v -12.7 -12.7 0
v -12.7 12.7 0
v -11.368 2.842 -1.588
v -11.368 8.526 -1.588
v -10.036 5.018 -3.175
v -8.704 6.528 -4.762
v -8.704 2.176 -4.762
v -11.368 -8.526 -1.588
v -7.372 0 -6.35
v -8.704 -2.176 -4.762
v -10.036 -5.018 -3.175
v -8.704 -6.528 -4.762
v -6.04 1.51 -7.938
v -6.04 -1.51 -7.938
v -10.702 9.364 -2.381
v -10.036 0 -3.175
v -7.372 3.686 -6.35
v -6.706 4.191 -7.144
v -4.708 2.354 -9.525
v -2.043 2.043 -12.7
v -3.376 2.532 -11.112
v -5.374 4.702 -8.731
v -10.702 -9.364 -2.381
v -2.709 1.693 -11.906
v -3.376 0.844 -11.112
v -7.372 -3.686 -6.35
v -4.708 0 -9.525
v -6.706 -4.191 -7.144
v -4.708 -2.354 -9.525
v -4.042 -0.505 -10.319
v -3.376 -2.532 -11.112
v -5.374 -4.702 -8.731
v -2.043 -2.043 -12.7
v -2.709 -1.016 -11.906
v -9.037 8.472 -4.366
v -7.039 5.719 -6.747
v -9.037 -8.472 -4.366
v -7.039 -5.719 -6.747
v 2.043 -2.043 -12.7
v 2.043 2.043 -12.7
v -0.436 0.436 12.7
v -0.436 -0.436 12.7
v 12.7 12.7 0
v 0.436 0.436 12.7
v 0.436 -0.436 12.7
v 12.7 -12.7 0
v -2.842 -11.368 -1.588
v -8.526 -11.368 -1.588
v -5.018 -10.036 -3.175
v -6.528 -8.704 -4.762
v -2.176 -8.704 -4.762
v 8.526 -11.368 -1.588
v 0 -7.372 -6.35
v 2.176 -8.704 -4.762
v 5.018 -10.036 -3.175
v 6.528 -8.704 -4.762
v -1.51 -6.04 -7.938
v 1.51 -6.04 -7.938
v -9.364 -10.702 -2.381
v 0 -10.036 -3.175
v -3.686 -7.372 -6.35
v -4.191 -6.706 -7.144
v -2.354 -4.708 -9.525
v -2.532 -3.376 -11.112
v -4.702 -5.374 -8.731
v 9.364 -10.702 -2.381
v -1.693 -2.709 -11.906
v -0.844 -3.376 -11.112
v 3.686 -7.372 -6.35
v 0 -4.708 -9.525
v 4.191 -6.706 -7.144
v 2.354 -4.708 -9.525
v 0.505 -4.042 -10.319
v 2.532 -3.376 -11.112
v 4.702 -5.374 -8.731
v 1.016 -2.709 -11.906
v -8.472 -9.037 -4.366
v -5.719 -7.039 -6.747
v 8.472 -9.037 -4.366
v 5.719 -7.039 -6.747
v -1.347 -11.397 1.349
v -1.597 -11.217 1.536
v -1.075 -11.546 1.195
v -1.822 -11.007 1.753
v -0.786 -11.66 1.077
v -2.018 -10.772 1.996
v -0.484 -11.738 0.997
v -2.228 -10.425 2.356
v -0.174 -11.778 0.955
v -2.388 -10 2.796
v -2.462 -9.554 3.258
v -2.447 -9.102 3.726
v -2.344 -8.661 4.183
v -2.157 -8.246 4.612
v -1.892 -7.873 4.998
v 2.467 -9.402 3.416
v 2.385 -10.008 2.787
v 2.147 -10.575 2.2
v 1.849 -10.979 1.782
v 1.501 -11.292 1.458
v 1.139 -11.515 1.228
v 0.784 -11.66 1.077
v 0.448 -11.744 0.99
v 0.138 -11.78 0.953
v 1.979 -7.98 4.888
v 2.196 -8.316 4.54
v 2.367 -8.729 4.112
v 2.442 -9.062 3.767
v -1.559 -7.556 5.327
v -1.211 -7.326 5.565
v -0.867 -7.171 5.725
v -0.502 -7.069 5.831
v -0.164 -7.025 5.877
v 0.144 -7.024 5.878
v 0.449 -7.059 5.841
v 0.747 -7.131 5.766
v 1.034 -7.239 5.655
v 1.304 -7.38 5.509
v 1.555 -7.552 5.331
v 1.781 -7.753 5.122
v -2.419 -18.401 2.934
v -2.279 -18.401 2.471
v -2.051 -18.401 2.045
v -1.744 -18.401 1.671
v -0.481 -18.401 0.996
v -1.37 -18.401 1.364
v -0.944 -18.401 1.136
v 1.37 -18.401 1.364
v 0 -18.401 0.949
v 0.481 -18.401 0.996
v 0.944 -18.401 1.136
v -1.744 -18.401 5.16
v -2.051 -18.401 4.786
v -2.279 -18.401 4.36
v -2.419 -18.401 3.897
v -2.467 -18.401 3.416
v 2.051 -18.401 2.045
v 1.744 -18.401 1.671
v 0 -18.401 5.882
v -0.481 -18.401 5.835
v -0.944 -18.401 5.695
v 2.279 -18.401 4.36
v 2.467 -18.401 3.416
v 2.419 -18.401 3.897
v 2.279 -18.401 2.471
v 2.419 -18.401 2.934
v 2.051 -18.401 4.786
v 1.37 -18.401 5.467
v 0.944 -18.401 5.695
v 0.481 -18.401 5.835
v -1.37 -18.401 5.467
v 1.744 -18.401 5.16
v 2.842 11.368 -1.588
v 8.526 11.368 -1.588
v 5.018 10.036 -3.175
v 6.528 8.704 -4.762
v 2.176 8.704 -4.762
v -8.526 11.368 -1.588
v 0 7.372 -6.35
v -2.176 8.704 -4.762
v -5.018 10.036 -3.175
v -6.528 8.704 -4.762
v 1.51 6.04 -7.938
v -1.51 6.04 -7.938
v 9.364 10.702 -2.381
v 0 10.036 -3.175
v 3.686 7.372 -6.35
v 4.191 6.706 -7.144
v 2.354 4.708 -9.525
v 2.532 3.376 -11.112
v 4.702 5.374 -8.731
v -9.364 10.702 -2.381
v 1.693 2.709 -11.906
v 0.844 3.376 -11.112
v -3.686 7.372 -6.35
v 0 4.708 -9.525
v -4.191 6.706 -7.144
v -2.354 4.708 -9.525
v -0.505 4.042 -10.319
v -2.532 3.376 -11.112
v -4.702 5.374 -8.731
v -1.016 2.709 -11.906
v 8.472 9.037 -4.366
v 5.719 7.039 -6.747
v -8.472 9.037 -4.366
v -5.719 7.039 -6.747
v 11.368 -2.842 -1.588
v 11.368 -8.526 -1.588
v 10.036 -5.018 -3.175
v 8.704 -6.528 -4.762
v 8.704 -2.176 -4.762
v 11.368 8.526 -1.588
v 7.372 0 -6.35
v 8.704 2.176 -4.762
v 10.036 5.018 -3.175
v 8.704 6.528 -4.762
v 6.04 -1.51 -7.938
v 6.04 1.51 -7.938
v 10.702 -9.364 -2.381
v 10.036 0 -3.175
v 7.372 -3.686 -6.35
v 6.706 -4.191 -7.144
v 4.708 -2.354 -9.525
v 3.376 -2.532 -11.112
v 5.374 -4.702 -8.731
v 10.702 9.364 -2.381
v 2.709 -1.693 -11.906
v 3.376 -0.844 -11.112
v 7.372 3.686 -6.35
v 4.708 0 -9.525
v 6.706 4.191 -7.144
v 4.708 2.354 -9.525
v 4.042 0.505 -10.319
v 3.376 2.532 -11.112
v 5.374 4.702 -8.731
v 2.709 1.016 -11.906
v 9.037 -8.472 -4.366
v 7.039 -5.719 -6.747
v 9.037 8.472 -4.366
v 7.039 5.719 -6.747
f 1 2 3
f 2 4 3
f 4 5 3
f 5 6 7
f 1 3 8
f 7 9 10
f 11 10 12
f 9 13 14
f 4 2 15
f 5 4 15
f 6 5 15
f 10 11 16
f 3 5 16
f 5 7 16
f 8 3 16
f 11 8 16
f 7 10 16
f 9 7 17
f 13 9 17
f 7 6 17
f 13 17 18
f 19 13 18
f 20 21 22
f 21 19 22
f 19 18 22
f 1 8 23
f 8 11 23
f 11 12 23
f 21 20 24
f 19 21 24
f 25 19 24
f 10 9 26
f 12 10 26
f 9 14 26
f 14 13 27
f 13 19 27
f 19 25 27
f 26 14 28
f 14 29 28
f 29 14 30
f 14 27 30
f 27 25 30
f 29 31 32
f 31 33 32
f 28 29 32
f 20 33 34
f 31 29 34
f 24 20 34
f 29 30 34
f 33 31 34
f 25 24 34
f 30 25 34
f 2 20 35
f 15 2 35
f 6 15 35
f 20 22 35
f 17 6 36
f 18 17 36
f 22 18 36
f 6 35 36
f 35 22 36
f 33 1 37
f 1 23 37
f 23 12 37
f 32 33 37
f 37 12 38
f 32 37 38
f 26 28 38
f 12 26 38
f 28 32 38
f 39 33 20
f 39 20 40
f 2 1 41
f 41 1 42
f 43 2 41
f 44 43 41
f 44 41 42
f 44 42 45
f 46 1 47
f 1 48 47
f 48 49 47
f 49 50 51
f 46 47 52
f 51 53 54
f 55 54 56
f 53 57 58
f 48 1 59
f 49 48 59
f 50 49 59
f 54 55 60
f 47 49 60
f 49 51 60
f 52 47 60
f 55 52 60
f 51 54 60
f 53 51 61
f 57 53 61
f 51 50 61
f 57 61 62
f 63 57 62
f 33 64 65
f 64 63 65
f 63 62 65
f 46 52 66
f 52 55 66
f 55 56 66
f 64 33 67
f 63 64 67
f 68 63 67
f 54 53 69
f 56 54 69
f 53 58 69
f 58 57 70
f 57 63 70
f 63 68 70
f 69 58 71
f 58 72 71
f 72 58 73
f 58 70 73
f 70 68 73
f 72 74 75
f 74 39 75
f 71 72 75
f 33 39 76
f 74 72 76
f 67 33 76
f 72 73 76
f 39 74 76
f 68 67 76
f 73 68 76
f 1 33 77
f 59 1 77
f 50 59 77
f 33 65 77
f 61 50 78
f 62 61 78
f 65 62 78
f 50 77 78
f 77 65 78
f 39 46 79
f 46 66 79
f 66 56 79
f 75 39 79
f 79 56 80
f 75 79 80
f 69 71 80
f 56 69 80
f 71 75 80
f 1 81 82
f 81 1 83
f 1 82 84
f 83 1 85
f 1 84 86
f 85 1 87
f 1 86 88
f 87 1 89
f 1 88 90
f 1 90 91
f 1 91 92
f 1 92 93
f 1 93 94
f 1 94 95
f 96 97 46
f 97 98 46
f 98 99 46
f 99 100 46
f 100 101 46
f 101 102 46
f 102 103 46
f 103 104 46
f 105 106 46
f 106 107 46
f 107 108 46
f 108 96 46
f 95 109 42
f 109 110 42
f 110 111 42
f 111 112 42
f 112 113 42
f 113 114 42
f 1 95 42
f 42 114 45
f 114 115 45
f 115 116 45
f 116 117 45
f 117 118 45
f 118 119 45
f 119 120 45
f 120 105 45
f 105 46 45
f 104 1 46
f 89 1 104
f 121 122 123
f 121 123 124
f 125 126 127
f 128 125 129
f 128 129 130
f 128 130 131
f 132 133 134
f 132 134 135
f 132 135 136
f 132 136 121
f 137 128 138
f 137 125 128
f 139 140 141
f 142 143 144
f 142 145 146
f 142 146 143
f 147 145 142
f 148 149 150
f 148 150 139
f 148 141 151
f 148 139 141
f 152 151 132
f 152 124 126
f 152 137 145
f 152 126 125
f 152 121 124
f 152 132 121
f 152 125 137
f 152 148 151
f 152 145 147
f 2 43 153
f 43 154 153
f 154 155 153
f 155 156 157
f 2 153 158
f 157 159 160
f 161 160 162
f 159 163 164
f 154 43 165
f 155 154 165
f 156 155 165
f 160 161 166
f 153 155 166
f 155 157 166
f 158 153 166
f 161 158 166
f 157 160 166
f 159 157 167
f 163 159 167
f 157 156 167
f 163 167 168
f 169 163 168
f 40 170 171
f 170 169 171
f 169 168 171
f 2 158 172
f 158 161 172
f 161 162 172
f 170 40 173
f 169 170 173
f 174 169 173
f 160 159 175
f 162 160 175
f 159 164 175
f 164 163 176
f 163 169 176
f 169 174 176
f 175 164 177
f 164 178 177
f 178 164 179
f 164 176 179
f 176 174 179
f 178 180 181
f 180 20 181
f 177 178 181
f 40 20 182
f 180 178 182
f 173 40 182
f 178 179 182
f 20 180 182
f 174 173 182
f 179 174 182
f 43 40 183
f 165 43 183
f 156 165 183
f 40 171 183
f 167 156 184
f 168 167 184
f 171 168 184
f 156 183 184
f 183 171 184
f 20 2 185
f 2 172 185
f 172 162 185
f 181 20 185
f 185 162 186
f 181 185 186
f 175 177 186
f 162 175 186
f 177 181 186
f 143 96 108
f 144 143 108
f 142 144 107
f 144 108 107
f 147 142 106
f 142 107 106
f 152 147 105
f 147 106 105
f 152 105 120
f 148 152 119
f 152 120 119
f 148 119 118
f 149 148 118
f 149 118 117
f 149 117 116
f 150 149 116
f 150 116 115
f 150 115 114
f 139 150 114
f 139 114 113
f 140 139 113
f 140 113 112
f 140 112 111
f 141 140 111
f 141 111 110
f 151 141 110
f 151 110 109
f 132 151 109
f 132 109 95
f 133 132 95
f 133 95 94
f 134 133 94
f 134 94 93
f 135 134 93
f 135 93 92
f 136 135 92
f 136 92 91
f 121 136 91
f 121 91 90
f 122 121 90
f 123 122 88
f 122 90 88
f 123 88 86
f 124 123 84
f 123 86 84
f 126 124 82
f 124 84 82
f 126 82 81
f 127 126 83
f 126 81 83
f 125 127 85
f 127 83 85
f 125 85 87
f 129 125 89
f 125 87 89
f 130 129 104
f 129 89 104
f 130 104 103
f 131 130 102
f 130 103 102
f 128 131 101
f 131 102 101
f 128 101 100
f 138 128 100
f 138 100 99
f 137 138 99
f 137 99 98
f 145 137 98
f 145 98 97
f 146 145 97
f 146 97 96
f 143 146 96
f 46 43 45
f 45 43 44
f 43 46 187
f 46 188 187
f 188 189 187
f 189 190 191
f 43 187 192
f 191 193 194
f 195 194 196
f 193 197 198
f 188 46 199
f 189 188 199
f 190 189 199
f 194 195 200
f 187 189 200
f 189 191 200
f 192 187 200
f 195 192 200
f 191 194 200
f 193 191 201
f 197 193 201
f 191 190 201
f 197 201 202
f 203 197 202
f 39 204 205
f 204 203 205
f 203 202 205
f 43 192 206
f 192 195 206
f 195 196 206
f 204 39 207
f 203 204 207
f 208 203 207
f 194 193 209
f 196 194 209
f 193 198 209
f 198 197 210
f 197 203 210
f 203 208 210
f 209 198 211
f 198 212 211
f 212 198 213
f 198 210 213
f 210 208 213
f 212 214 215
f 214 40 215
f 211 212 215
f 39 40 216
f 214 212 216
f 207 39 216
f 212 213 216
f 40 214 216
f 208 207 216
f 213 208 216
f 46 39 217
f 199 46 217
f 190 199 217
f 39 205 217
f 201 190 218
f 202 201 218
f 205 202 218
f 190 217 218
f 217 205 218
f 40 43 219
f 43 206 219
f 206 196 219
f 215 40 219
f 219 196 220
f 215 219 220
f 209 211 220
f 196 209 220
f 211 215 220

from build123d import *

# Parameters (mm, degrees)
F0_W          = 25.4
F0_H          = 25.4
F1_DEPTH      = 12.7
F1_TAPER      = 44
F1_DEPTH_BACK = 12.7
F1_TAPER_BACK = 40
F4_R          = 2.4668043614
F5_DEPTH      = 14.478


with BuildPart() as f1:
    # F0 (on Top) → F1 (new body, two sides)
    with BuildSketch(Plane.XY) as f1_sk:
        Rectangle(F0_W, F0_H)
    extrude(amount=F1_DEPTH, taper=F1_TAPER)
    extrude(f1_sk.sketch, amount=-F1_DEPTH_BACK, taper=F1_TAPER_BACK)

    # F4 (on face) → F5 (join)
    with BuildSketch(Plane.XZ.offset(3.9232242852)):
        with Locations((0, 3.4155005123)):
            Circle(F4_R)
    extrude(amount=F5_DEPTH)


solid = f1.part
